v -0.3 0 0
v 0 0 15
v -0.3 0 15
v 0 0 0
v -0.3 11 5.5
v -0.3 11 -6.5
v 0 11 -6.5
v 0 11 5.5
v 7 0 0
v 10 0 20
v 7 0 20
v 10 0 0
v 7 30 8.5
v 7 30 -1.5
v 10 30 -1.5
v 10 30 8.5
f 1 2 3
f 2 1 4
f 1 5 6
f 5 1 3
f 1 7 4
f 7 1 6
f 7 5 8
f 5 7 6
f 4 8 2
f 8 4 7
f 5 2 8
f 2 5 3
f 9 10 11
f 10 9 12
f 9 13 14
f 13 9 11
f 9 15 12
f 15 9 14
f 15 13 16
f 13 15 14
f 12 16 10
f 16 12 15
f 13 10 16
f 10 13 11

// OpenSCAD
module fin(root_chord, tip_chord, height, sweep, thickness)
{
    translate([0, 0, root_chord])
    rotate([-90, 0, 0])
    rotate([0, -90, 0])
    linear_extrude(thickness)
    polygon([[0, 0], [0, root_chord], [height, tip_chord+sweep], [height, sweep]]);
}

color("green")
fin(15, 12, 11, 9.5, 0.3);


translate([10, 0, 0])
fin(20, 10, 30, 11.5, 3);
